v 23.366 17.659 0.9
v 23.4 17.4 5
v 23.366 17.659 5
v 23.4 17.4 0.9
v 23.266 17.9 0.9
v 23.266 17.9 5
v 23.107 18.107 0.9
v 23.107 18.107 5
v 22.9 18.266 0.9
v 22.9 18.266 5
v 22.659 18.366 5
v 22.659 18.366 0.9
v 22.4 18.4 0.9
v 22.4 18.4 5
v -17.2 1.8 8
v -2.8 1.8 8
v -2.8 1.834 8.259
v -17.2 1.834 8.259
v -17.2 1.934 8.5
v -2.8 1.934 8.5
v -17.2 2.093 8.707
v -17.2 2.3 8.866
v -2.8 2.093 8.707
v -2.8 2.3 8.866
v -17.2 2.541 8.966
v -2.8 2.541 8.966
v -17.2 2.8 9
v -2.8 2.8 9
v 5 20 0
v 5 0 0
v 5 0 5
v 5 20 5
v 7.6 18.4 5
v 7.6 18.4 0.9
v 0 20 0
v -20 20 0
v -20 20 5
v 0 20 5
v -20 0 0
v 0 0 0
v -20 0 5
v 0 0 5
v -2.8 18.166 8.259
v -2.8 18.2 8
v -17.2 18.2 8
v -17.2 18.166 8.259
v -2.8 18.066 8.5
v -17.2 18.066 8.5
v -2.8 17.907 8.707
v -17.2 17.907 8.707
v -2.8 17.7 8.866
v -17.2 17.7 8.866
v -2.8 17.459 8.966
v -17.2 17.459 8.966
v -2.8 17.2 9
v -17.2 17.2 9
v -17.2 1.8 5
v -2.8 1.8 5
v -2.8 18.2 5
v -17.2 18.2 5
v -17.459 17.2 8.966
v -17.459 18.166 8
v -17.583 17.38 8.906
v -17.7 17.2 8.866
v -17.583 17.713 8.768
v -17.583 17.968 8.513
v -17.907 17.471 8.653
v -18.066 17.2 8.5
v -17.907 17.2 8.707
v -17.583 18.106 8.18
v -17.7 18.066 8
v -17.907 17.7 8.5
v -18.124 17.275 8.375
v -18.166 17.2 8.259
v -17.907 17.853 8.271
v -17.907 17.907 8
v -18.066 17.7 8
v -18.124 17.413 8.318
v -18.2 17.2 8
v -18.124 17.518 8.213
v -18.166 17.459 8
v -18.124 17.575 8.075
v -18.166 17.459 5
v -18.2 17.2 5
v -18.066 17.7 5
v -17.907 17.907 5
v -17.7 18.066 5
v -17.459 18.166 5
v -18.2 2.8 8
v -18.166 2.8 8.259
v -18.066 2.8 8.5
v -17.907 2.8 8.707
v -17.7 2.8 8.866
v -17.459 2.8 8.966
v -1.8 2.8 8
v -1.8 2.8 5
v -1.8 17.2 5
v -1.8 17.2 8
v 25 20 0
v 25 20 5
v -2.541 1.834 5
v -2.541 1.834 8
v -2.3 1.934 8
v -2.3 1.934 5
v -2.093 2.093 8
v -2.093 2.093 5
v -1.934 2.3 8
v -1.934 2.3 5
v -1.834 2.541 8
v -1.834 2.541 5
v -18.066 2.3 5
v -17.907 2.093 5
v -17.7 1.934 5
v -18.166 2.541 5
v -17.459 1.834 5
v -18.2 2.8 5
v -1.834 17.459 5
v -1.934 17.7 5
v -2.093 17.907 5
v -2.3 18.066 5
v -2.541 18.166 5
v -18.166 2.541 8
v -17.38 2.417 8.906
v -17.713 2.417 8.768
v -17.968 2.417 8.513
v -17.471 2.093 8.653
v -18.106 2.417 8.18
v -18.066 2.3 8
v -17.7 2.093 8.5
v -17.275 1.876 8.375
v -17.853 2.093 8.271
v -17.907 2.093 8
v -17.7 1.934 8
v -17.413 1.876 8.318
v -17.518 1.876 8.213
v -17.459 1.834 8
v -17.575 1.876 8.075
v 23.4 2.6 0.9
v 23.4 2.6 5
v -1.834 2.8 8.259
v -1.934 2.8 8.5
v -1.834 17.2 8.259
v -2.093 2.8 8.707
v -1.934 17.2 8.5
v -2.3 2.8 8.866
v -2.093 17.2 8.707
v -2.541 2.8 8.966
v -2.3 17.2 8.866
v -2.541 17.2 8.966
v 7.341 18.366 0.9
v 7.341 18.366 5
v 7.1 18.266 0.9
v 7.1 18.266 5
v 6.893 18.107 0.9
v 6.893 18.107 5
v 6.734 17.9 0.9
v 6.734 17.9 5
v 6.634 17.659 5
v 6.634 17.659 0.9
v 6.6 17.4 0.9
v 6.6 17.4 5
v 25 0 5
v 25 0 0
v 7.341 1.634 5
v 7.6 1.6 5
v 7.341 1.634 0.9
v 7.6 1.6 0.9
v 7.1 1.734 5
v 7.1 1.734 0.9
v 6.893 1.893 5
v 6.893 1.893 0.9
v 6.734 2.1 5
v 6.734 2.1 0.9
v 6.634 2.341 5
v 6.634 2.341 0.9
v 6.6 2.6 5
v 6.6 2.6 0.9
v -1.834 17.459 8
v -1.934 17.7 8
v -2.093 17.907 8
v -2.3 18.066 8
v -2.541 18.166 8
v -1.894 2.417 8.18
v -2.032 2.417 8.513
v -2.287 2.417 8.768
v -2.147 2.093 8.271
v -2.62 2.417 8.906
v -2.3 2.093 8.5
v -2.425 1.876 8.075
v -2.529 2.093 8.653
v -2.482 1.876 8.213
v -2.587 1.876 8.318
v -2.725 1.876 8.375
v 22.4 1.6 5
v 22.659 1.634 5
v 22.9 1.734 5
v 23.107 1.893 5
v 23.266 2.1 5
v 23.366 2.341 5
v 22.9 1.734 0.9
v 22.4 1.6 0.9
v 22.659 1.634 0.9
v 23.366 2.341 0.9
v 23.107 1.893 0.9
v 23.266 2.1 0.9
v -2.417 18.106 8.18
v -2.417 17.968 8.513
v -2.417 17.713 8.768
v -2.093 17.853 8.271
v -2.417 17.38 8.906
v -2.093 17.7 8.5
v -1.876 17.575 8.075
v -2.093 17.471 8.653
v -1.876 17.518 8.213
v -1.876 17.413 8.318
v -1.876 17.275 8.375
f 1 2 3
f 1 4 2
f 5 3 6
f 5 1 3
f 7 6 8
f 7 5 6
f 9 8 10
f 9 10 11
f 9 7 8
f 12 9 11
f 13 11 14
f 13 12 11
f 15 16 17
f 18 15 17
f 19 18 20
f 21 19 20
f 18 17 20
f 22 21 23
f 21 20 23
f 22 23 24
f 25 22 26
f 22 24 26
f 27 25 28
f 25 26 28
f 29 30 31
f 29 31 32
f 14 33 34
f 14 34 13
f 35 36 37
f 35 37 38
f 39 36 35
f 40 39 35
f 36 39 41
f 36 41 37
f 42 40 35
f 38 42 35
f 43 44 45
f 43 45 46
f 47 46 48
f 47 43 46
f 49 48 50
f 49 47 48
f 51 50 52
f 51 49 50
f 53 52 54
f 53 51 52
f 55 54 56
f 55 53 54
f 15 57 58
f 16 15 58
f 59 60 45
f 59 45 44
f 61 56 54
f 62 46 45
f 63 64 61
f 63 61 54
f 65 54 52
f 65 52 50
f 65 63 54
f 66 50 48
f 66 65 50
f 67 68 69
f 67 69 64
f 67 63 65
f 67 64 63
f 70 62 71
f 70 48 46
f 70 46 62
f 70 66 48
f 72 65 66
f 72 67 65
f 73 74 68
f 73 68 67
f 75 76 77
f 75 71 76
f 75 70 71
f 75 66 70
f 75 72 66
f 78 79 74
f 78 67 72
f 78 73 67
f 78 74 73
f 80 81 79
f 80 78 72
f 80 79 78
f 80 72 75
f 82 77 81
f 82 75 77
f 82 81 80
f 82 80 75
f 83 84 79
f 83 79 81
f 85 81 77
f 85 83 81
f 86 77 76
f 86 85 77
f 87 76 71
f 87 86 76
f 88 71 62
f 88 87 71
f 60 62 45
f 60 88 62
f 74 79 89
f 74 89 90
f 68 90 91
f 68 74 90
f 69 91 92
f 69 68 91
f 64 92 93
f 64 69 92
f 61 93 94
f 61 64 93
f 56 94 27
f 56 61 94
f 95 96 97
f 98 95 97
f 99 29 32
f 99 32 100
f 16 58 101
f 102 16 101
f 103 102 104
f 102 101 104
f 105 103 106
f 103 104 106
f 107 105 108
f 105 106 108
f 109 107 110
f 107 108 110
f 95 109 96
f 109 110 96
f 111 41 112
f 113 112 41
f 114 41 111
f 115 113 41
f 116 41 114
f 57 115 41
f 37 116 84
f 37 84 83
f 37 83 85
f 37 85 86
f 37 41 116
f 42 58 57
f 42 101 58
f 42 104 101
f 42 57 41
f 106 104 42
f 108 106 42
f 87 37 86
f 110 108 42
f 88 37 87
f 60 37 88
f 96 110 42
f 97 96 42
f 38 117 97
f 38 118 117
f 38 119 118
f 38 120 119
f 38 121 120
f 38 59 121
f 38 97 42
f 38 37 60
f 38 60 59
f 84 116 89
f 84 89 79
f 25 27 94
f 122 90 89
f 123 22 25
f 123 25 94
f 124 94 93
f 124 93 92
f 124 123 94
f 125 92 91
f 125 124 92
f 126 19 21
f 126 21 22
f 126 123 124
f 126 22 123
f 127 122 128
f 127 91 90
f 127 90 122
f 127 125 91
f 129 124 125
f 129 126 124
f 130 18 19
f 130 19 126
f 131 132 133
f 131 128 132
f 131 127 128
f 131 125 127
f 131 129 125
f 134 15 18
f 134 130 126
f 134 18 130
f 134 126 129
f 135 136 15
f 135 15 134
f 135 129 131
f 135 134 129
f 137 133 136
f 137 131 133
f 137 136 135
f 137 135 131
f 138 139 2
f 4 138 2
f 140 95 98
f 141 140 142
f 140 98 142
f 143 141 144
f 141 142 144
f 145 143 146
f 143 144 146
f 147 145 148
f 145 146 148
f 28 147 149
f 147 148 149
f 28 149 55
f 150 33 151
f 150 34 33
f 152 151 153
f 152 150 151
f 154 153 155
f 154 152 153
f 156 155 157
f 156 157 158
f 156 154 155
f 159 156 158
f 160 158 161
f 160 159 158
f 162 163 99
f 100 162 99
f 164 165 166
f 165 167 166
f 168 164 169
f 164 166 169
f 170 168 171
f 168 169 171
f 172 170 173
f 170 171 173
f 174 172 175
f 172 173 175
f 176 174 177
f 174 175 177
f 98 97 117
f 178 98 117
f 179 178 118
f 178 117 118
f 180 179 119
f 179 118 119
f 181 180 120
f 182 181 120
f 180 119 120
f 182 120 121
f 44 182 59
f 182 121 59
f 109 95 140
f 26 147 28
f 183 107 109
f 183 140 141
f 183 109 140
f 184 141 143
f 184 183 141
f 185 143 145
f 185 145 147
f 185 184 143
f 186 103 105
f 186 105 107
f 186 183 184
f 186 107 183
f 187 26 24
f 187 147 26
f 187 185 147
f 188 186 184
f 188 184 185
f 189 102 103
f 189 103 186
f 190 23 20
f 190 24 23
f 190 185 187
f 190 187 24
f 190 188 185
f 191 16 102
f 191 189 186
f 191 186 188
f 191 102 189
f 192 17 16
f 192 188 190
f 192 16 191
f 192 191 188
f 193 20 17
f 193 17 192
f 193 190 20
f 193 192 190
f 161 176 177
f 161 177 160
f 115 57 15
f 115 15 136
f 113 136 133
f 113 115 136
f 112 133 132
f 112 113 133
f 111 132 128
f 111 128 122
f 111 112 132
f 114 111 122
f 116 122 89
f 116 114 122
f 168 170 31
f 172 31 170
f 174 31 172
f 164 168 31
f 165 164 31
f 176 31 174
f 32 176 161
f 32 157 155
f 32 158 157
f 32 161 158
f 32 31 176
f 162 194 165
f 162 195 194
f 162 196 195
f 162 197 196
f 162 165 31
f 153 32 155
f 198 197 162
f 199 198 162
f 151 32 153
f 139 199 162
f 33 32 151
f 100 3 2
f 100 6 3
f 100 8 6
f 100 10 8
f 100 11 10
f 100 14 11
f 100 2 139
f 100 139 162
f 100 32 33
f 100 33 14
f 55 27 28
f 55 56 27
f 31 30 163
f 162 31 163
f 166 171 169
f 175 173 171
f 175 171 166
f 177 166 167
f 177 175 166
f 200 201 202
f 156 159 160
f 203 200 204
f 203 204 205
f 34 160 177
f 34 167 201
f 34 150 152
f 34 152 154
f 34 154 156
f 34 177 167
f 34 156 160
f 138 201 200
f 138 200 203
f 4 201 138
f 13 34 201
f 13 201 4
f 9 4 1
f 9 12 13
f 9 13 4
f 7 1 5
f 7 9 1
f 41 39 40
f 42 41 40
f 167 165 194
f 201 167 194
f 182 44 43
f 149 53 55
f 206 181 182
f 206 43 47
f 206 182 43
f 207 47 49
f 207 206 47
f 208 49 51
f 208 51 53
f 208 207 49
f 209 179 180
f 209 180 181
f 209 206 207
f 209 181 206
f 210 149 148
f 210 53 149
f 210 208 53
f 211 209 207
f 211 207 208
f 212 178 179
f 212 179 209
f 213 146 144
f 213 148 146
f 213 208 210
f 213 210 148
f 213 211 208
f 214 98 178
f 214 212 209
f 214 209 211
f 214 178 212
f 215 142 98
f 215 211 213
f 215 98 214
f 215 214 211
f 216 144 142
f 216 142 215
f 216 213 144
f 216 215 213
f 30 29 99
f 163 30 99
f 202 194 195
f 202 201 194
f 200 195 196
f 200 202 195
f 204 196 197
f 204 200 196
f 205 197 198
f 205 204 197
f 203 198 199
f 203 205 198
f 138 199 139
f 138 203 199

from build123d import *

# Parameters (mm, degrees)
F0_W         = 20
F0_H         = 20
F1_DEPTH     = 5
F2_W         = 16.4
F2_H         = 16.4
F3_DEPTH     = 4
F4_R         = 1
F5_W         = 20
F5_H         = 20
F6_DEPTH     = 5
F7_W         = 16.8
F7_H         = 16.8
F8_DEPTH     = 4.1
F9_T1_DEPTH  = 3
F9_S5_W      = 1
F9_S5_H      = 1
F9_T6_DEPTH  = 1
F9_S11_W     = 1
F9_S11_H     = 1
F9_T12_DEPTH = 1
F9_S17_W     = 1
F9_S17_H     = 1
F9_T18_DEPTH = 1
F9_S23_W     = 1
F9_S23_H     = 1
F9_T24_DEPTH = 1
F10_R        = 1


# Not quite as in the source:
# - a fillet or chamfer that OpenCascade refuses, or shapes differently, is made with other operations: its cross-section is extruded or revolved along the edge and cut away or added


with BuildPart() as f1:
    # F0 (on Top) → F1 (new body)
    with BuildSketch(Plane.XY):
        with Locations((-10, 10)):
            Rectangle(F0_W, F0_H)
    extrude(amount=F1_DEPTH)

    # F2 (on face) → F3 (join)
    with BuildSketch(Plane.XY.offset(5)):
        with Locations((-10, 10)):
            Rectangle(F2_W, F2_H)
    extrude(amount=F3_DEPTH)

    # F4
    f4_edges = [f1.edges().sort_by_distance(p)[0] for p in [
        (-10, 1.8, 9),
        (-1.8, 10, 9),
        (-10, 18.2, 9),
        (-18.2, 10, 9),
    ]]
    fillet(f4_edges, radius=F4_R)

    # F9: fillet of radius 1 on 4 edges, made by hand

    # F9_s2 → F9_t1 (cut)
    with BuildSketch(Plane.XY.offset(5)):
        with BuildLine():
            ThreePointArc((-1.8, 17.2), (-2.0928932188, 17.9071067812), (-2.8, 18.2))
            Line((-2.8, 18.2), (-1.8, 18.2))
            Line((-1.8, 18.2), (-1.8, 17.2))
        make_face()
        with BuildLine():
            ThreePointArc((-2.8, 1.8), (-2.0928932188, 2.0928932188), (-1.8, 2.8))
            Line((-1.8, 2.8), (-1.8, 1.8))
            Line((-1.8, 1.8), (-2.8, 1.8))
        make_face()
        with BuildLine():
            ThreePointArc((-17.2, 1.8), (-17.9071067812, 2.0928932188), (-18.2, 2.8))
            Line((-18.2, 2.8), (-18.2, 1.8))
            Line((-18.2, 1.8), (-17.2, 1.8))
        make_face()
        with BuildLine():
            ThreePointArc((-18.2, 17.2), (-17.9071067812, 17.9071067812), (-17.2, 18.2))
            Line((-17.2, 18.2), (-18.2, 18.2))
            Line((-18.2, 18.2), (-18.2, 17.2))
        make_face()
    extrude(amount=F9_T1_DEPTH, mode=Mode.SUBTRACT)


with BuildPart() as f6:
    # F5 (on Top) → F6 (new body)
    with BuildSketch(Plane.XY):
        with Locations((15, 10)):
            Rectangle(F5_W, F5_H)
    extrude(amount=F6_DEPTH)

    # F7 (on face) → F8 (cut)
    with BuildSketch(Plane.XY.offset(5)):
        with Locations((15, 10)):
            Rectangle(F7_W, F7_H)
    extrude(amount=-F8_DEPTH, mode=Mode.SUBTRACT)

    # F10
    f10_edges = [f6.edges().sort_by_distance(p)[0] for p in [
        (6.6, 18.4, 2.95),
        (23.4, 18.4, 2.95),
        (23.4, 1.6, 2.95),
        (6.6, 1.6, 2.95),
    ]]
    fillet(f10_edges, radius=F10_R)


with BuildPart() as f9_tool4:
    # F9_s5 → F9_t6 (new body)
    with BuildSketch(Plane.YZ.offset(-17.2)):
        with Locations((17.7, 8.5)):
            Rectangle(F9_S5_W, F9_S5_H)
    extrude(amount=-F9_T6_DEPTH)

    # F9_s7 → F9_t8 (revolve, cut)
    with BuildSketch(Plane(origin=(-17.2, 17.2, 8), x_dir=(0, -0.7071067812, -0.7071067812), z_dir=(0, 0.7071067812, -0.7071067812))):
        with BuildLine():
            ThreePointArc((0, -1), (1, 0), (0, 1))
            Line((0, 1), (0, -1))
        make_face()
    revolve(axis=Axis((-17.2, 17.2, 8), (-1, 0, 0)), mode=Mode.SUBTRACT)


with BuildPart() as f1_1:
    add(f1.part)

    # F9_t3: cut F9_tool4
    add(f9_tool4.part, mode=Mode.SUBTRACT)


with BuildPart() as f9_tool10:
    # F9_s11 → F9_t12 (new body)
    with BuildSketch(Plane.XZ.offset(-2.8)):
        with Locations((-17.7, 8.5)):
            Rectangle(F9_S11_W, F9_S11_H)
    extrude(amount=F9_T12_DEPTH)

    # F9_s13 → F9_t14 (revolve, cut)
    with BuildSketch(Plane(origin=(-17.2, 2.8, 8), x_dir=(0.7071067812, 0, -0.7071067812), z_dir=(-0.7071067812, 0, -0.7071067812))):
        with BuildLine():
            ThreePointArc((0, -1), (1, 0), (0, 1))
            Line((0, 1), (0, -1))
        make_face()
    revolve(axis=Axis((-17.2, 2.8, 8), (0, -1, 0)), mode=Mode.SUBTRACT)


with BuildPart() as f1_2:
    add(f1_1.part)

    # F9_t9: cut F9_tool10
    add(f9_tool10.part, mode=Mode.SUBTRACT)


with BuildPart() as f9_tool16:
    # F9_s17 → F9_t18 (new body)
    with BuildSketch(Plane.XZ.offset(-2.8)):
        with Locations((-2.3, 8.5)):
            Rectangle(F9_S17_W, F9_S17_H)
    extrude(amount=F9_T18_DEPTH)

    # F9_s19 → F9_t20 (revolve, cut)
    with BuildSketch(Plane(origin=(-2.8, 2.8, 8), x_dir=(-0.7071067812, 0, -0.7071067812), z_dir=(-0.7071067812, 0, 0.7071067812))):
        with BuildLine():
            ThreePointArc((0, -1), (1, 0), (0, 1))
            Line((0, 1), (0, -1))
        make_face()
    revolve(axis=Axis((-2.8, 2.8, 8), (0, -1, 0)), mode=Mode.SUBTRACT)


with BuildPart() as f1_3:
    add(f1_2.part)

    # F9_t15: cut F9_tool16
    add(f9_tool16.part, mode=Mode.SUBTRACT)


with BuildPart() as f9_tool22:
    # F9_s23 → F9_t24 (new body)
    with BuildSketch(Plane.YZ.offset(-2.8)):
        with Locations((17.7, 8.5)):
            Rectangle(F9_S23_W, F9_S23_H)
    extrude(amount=F9_T24_DEPTH)

    # F9_s25 → F9_t26 (revolve, cut)
    with BuildSketch(Plane(origin=(-2.8, 17.2, 8), x_dir=(0, -0.7071067812, -0.7071067812), z_dir=(0, -0.7071067812, 0.7071067812))):
        with BuildLine():
            ThreePointArc((0, -1), (1, 0), (0, 1))
            Line((0, 1), (0, -1))
        make_face()
    revolve(axis=Axis((-2.8, 17.2, 8), (1, 0, 0)), mode=Mode.SUBTRACT)


with BuildPart() as f1_4:
    add(f1_3.part)

    # F9_t21: cut F9_tool22
    add(f9_tool22.part, mode=Mode.SUBTRACT)


solid = Compound([f6.part, f1_4.part])
